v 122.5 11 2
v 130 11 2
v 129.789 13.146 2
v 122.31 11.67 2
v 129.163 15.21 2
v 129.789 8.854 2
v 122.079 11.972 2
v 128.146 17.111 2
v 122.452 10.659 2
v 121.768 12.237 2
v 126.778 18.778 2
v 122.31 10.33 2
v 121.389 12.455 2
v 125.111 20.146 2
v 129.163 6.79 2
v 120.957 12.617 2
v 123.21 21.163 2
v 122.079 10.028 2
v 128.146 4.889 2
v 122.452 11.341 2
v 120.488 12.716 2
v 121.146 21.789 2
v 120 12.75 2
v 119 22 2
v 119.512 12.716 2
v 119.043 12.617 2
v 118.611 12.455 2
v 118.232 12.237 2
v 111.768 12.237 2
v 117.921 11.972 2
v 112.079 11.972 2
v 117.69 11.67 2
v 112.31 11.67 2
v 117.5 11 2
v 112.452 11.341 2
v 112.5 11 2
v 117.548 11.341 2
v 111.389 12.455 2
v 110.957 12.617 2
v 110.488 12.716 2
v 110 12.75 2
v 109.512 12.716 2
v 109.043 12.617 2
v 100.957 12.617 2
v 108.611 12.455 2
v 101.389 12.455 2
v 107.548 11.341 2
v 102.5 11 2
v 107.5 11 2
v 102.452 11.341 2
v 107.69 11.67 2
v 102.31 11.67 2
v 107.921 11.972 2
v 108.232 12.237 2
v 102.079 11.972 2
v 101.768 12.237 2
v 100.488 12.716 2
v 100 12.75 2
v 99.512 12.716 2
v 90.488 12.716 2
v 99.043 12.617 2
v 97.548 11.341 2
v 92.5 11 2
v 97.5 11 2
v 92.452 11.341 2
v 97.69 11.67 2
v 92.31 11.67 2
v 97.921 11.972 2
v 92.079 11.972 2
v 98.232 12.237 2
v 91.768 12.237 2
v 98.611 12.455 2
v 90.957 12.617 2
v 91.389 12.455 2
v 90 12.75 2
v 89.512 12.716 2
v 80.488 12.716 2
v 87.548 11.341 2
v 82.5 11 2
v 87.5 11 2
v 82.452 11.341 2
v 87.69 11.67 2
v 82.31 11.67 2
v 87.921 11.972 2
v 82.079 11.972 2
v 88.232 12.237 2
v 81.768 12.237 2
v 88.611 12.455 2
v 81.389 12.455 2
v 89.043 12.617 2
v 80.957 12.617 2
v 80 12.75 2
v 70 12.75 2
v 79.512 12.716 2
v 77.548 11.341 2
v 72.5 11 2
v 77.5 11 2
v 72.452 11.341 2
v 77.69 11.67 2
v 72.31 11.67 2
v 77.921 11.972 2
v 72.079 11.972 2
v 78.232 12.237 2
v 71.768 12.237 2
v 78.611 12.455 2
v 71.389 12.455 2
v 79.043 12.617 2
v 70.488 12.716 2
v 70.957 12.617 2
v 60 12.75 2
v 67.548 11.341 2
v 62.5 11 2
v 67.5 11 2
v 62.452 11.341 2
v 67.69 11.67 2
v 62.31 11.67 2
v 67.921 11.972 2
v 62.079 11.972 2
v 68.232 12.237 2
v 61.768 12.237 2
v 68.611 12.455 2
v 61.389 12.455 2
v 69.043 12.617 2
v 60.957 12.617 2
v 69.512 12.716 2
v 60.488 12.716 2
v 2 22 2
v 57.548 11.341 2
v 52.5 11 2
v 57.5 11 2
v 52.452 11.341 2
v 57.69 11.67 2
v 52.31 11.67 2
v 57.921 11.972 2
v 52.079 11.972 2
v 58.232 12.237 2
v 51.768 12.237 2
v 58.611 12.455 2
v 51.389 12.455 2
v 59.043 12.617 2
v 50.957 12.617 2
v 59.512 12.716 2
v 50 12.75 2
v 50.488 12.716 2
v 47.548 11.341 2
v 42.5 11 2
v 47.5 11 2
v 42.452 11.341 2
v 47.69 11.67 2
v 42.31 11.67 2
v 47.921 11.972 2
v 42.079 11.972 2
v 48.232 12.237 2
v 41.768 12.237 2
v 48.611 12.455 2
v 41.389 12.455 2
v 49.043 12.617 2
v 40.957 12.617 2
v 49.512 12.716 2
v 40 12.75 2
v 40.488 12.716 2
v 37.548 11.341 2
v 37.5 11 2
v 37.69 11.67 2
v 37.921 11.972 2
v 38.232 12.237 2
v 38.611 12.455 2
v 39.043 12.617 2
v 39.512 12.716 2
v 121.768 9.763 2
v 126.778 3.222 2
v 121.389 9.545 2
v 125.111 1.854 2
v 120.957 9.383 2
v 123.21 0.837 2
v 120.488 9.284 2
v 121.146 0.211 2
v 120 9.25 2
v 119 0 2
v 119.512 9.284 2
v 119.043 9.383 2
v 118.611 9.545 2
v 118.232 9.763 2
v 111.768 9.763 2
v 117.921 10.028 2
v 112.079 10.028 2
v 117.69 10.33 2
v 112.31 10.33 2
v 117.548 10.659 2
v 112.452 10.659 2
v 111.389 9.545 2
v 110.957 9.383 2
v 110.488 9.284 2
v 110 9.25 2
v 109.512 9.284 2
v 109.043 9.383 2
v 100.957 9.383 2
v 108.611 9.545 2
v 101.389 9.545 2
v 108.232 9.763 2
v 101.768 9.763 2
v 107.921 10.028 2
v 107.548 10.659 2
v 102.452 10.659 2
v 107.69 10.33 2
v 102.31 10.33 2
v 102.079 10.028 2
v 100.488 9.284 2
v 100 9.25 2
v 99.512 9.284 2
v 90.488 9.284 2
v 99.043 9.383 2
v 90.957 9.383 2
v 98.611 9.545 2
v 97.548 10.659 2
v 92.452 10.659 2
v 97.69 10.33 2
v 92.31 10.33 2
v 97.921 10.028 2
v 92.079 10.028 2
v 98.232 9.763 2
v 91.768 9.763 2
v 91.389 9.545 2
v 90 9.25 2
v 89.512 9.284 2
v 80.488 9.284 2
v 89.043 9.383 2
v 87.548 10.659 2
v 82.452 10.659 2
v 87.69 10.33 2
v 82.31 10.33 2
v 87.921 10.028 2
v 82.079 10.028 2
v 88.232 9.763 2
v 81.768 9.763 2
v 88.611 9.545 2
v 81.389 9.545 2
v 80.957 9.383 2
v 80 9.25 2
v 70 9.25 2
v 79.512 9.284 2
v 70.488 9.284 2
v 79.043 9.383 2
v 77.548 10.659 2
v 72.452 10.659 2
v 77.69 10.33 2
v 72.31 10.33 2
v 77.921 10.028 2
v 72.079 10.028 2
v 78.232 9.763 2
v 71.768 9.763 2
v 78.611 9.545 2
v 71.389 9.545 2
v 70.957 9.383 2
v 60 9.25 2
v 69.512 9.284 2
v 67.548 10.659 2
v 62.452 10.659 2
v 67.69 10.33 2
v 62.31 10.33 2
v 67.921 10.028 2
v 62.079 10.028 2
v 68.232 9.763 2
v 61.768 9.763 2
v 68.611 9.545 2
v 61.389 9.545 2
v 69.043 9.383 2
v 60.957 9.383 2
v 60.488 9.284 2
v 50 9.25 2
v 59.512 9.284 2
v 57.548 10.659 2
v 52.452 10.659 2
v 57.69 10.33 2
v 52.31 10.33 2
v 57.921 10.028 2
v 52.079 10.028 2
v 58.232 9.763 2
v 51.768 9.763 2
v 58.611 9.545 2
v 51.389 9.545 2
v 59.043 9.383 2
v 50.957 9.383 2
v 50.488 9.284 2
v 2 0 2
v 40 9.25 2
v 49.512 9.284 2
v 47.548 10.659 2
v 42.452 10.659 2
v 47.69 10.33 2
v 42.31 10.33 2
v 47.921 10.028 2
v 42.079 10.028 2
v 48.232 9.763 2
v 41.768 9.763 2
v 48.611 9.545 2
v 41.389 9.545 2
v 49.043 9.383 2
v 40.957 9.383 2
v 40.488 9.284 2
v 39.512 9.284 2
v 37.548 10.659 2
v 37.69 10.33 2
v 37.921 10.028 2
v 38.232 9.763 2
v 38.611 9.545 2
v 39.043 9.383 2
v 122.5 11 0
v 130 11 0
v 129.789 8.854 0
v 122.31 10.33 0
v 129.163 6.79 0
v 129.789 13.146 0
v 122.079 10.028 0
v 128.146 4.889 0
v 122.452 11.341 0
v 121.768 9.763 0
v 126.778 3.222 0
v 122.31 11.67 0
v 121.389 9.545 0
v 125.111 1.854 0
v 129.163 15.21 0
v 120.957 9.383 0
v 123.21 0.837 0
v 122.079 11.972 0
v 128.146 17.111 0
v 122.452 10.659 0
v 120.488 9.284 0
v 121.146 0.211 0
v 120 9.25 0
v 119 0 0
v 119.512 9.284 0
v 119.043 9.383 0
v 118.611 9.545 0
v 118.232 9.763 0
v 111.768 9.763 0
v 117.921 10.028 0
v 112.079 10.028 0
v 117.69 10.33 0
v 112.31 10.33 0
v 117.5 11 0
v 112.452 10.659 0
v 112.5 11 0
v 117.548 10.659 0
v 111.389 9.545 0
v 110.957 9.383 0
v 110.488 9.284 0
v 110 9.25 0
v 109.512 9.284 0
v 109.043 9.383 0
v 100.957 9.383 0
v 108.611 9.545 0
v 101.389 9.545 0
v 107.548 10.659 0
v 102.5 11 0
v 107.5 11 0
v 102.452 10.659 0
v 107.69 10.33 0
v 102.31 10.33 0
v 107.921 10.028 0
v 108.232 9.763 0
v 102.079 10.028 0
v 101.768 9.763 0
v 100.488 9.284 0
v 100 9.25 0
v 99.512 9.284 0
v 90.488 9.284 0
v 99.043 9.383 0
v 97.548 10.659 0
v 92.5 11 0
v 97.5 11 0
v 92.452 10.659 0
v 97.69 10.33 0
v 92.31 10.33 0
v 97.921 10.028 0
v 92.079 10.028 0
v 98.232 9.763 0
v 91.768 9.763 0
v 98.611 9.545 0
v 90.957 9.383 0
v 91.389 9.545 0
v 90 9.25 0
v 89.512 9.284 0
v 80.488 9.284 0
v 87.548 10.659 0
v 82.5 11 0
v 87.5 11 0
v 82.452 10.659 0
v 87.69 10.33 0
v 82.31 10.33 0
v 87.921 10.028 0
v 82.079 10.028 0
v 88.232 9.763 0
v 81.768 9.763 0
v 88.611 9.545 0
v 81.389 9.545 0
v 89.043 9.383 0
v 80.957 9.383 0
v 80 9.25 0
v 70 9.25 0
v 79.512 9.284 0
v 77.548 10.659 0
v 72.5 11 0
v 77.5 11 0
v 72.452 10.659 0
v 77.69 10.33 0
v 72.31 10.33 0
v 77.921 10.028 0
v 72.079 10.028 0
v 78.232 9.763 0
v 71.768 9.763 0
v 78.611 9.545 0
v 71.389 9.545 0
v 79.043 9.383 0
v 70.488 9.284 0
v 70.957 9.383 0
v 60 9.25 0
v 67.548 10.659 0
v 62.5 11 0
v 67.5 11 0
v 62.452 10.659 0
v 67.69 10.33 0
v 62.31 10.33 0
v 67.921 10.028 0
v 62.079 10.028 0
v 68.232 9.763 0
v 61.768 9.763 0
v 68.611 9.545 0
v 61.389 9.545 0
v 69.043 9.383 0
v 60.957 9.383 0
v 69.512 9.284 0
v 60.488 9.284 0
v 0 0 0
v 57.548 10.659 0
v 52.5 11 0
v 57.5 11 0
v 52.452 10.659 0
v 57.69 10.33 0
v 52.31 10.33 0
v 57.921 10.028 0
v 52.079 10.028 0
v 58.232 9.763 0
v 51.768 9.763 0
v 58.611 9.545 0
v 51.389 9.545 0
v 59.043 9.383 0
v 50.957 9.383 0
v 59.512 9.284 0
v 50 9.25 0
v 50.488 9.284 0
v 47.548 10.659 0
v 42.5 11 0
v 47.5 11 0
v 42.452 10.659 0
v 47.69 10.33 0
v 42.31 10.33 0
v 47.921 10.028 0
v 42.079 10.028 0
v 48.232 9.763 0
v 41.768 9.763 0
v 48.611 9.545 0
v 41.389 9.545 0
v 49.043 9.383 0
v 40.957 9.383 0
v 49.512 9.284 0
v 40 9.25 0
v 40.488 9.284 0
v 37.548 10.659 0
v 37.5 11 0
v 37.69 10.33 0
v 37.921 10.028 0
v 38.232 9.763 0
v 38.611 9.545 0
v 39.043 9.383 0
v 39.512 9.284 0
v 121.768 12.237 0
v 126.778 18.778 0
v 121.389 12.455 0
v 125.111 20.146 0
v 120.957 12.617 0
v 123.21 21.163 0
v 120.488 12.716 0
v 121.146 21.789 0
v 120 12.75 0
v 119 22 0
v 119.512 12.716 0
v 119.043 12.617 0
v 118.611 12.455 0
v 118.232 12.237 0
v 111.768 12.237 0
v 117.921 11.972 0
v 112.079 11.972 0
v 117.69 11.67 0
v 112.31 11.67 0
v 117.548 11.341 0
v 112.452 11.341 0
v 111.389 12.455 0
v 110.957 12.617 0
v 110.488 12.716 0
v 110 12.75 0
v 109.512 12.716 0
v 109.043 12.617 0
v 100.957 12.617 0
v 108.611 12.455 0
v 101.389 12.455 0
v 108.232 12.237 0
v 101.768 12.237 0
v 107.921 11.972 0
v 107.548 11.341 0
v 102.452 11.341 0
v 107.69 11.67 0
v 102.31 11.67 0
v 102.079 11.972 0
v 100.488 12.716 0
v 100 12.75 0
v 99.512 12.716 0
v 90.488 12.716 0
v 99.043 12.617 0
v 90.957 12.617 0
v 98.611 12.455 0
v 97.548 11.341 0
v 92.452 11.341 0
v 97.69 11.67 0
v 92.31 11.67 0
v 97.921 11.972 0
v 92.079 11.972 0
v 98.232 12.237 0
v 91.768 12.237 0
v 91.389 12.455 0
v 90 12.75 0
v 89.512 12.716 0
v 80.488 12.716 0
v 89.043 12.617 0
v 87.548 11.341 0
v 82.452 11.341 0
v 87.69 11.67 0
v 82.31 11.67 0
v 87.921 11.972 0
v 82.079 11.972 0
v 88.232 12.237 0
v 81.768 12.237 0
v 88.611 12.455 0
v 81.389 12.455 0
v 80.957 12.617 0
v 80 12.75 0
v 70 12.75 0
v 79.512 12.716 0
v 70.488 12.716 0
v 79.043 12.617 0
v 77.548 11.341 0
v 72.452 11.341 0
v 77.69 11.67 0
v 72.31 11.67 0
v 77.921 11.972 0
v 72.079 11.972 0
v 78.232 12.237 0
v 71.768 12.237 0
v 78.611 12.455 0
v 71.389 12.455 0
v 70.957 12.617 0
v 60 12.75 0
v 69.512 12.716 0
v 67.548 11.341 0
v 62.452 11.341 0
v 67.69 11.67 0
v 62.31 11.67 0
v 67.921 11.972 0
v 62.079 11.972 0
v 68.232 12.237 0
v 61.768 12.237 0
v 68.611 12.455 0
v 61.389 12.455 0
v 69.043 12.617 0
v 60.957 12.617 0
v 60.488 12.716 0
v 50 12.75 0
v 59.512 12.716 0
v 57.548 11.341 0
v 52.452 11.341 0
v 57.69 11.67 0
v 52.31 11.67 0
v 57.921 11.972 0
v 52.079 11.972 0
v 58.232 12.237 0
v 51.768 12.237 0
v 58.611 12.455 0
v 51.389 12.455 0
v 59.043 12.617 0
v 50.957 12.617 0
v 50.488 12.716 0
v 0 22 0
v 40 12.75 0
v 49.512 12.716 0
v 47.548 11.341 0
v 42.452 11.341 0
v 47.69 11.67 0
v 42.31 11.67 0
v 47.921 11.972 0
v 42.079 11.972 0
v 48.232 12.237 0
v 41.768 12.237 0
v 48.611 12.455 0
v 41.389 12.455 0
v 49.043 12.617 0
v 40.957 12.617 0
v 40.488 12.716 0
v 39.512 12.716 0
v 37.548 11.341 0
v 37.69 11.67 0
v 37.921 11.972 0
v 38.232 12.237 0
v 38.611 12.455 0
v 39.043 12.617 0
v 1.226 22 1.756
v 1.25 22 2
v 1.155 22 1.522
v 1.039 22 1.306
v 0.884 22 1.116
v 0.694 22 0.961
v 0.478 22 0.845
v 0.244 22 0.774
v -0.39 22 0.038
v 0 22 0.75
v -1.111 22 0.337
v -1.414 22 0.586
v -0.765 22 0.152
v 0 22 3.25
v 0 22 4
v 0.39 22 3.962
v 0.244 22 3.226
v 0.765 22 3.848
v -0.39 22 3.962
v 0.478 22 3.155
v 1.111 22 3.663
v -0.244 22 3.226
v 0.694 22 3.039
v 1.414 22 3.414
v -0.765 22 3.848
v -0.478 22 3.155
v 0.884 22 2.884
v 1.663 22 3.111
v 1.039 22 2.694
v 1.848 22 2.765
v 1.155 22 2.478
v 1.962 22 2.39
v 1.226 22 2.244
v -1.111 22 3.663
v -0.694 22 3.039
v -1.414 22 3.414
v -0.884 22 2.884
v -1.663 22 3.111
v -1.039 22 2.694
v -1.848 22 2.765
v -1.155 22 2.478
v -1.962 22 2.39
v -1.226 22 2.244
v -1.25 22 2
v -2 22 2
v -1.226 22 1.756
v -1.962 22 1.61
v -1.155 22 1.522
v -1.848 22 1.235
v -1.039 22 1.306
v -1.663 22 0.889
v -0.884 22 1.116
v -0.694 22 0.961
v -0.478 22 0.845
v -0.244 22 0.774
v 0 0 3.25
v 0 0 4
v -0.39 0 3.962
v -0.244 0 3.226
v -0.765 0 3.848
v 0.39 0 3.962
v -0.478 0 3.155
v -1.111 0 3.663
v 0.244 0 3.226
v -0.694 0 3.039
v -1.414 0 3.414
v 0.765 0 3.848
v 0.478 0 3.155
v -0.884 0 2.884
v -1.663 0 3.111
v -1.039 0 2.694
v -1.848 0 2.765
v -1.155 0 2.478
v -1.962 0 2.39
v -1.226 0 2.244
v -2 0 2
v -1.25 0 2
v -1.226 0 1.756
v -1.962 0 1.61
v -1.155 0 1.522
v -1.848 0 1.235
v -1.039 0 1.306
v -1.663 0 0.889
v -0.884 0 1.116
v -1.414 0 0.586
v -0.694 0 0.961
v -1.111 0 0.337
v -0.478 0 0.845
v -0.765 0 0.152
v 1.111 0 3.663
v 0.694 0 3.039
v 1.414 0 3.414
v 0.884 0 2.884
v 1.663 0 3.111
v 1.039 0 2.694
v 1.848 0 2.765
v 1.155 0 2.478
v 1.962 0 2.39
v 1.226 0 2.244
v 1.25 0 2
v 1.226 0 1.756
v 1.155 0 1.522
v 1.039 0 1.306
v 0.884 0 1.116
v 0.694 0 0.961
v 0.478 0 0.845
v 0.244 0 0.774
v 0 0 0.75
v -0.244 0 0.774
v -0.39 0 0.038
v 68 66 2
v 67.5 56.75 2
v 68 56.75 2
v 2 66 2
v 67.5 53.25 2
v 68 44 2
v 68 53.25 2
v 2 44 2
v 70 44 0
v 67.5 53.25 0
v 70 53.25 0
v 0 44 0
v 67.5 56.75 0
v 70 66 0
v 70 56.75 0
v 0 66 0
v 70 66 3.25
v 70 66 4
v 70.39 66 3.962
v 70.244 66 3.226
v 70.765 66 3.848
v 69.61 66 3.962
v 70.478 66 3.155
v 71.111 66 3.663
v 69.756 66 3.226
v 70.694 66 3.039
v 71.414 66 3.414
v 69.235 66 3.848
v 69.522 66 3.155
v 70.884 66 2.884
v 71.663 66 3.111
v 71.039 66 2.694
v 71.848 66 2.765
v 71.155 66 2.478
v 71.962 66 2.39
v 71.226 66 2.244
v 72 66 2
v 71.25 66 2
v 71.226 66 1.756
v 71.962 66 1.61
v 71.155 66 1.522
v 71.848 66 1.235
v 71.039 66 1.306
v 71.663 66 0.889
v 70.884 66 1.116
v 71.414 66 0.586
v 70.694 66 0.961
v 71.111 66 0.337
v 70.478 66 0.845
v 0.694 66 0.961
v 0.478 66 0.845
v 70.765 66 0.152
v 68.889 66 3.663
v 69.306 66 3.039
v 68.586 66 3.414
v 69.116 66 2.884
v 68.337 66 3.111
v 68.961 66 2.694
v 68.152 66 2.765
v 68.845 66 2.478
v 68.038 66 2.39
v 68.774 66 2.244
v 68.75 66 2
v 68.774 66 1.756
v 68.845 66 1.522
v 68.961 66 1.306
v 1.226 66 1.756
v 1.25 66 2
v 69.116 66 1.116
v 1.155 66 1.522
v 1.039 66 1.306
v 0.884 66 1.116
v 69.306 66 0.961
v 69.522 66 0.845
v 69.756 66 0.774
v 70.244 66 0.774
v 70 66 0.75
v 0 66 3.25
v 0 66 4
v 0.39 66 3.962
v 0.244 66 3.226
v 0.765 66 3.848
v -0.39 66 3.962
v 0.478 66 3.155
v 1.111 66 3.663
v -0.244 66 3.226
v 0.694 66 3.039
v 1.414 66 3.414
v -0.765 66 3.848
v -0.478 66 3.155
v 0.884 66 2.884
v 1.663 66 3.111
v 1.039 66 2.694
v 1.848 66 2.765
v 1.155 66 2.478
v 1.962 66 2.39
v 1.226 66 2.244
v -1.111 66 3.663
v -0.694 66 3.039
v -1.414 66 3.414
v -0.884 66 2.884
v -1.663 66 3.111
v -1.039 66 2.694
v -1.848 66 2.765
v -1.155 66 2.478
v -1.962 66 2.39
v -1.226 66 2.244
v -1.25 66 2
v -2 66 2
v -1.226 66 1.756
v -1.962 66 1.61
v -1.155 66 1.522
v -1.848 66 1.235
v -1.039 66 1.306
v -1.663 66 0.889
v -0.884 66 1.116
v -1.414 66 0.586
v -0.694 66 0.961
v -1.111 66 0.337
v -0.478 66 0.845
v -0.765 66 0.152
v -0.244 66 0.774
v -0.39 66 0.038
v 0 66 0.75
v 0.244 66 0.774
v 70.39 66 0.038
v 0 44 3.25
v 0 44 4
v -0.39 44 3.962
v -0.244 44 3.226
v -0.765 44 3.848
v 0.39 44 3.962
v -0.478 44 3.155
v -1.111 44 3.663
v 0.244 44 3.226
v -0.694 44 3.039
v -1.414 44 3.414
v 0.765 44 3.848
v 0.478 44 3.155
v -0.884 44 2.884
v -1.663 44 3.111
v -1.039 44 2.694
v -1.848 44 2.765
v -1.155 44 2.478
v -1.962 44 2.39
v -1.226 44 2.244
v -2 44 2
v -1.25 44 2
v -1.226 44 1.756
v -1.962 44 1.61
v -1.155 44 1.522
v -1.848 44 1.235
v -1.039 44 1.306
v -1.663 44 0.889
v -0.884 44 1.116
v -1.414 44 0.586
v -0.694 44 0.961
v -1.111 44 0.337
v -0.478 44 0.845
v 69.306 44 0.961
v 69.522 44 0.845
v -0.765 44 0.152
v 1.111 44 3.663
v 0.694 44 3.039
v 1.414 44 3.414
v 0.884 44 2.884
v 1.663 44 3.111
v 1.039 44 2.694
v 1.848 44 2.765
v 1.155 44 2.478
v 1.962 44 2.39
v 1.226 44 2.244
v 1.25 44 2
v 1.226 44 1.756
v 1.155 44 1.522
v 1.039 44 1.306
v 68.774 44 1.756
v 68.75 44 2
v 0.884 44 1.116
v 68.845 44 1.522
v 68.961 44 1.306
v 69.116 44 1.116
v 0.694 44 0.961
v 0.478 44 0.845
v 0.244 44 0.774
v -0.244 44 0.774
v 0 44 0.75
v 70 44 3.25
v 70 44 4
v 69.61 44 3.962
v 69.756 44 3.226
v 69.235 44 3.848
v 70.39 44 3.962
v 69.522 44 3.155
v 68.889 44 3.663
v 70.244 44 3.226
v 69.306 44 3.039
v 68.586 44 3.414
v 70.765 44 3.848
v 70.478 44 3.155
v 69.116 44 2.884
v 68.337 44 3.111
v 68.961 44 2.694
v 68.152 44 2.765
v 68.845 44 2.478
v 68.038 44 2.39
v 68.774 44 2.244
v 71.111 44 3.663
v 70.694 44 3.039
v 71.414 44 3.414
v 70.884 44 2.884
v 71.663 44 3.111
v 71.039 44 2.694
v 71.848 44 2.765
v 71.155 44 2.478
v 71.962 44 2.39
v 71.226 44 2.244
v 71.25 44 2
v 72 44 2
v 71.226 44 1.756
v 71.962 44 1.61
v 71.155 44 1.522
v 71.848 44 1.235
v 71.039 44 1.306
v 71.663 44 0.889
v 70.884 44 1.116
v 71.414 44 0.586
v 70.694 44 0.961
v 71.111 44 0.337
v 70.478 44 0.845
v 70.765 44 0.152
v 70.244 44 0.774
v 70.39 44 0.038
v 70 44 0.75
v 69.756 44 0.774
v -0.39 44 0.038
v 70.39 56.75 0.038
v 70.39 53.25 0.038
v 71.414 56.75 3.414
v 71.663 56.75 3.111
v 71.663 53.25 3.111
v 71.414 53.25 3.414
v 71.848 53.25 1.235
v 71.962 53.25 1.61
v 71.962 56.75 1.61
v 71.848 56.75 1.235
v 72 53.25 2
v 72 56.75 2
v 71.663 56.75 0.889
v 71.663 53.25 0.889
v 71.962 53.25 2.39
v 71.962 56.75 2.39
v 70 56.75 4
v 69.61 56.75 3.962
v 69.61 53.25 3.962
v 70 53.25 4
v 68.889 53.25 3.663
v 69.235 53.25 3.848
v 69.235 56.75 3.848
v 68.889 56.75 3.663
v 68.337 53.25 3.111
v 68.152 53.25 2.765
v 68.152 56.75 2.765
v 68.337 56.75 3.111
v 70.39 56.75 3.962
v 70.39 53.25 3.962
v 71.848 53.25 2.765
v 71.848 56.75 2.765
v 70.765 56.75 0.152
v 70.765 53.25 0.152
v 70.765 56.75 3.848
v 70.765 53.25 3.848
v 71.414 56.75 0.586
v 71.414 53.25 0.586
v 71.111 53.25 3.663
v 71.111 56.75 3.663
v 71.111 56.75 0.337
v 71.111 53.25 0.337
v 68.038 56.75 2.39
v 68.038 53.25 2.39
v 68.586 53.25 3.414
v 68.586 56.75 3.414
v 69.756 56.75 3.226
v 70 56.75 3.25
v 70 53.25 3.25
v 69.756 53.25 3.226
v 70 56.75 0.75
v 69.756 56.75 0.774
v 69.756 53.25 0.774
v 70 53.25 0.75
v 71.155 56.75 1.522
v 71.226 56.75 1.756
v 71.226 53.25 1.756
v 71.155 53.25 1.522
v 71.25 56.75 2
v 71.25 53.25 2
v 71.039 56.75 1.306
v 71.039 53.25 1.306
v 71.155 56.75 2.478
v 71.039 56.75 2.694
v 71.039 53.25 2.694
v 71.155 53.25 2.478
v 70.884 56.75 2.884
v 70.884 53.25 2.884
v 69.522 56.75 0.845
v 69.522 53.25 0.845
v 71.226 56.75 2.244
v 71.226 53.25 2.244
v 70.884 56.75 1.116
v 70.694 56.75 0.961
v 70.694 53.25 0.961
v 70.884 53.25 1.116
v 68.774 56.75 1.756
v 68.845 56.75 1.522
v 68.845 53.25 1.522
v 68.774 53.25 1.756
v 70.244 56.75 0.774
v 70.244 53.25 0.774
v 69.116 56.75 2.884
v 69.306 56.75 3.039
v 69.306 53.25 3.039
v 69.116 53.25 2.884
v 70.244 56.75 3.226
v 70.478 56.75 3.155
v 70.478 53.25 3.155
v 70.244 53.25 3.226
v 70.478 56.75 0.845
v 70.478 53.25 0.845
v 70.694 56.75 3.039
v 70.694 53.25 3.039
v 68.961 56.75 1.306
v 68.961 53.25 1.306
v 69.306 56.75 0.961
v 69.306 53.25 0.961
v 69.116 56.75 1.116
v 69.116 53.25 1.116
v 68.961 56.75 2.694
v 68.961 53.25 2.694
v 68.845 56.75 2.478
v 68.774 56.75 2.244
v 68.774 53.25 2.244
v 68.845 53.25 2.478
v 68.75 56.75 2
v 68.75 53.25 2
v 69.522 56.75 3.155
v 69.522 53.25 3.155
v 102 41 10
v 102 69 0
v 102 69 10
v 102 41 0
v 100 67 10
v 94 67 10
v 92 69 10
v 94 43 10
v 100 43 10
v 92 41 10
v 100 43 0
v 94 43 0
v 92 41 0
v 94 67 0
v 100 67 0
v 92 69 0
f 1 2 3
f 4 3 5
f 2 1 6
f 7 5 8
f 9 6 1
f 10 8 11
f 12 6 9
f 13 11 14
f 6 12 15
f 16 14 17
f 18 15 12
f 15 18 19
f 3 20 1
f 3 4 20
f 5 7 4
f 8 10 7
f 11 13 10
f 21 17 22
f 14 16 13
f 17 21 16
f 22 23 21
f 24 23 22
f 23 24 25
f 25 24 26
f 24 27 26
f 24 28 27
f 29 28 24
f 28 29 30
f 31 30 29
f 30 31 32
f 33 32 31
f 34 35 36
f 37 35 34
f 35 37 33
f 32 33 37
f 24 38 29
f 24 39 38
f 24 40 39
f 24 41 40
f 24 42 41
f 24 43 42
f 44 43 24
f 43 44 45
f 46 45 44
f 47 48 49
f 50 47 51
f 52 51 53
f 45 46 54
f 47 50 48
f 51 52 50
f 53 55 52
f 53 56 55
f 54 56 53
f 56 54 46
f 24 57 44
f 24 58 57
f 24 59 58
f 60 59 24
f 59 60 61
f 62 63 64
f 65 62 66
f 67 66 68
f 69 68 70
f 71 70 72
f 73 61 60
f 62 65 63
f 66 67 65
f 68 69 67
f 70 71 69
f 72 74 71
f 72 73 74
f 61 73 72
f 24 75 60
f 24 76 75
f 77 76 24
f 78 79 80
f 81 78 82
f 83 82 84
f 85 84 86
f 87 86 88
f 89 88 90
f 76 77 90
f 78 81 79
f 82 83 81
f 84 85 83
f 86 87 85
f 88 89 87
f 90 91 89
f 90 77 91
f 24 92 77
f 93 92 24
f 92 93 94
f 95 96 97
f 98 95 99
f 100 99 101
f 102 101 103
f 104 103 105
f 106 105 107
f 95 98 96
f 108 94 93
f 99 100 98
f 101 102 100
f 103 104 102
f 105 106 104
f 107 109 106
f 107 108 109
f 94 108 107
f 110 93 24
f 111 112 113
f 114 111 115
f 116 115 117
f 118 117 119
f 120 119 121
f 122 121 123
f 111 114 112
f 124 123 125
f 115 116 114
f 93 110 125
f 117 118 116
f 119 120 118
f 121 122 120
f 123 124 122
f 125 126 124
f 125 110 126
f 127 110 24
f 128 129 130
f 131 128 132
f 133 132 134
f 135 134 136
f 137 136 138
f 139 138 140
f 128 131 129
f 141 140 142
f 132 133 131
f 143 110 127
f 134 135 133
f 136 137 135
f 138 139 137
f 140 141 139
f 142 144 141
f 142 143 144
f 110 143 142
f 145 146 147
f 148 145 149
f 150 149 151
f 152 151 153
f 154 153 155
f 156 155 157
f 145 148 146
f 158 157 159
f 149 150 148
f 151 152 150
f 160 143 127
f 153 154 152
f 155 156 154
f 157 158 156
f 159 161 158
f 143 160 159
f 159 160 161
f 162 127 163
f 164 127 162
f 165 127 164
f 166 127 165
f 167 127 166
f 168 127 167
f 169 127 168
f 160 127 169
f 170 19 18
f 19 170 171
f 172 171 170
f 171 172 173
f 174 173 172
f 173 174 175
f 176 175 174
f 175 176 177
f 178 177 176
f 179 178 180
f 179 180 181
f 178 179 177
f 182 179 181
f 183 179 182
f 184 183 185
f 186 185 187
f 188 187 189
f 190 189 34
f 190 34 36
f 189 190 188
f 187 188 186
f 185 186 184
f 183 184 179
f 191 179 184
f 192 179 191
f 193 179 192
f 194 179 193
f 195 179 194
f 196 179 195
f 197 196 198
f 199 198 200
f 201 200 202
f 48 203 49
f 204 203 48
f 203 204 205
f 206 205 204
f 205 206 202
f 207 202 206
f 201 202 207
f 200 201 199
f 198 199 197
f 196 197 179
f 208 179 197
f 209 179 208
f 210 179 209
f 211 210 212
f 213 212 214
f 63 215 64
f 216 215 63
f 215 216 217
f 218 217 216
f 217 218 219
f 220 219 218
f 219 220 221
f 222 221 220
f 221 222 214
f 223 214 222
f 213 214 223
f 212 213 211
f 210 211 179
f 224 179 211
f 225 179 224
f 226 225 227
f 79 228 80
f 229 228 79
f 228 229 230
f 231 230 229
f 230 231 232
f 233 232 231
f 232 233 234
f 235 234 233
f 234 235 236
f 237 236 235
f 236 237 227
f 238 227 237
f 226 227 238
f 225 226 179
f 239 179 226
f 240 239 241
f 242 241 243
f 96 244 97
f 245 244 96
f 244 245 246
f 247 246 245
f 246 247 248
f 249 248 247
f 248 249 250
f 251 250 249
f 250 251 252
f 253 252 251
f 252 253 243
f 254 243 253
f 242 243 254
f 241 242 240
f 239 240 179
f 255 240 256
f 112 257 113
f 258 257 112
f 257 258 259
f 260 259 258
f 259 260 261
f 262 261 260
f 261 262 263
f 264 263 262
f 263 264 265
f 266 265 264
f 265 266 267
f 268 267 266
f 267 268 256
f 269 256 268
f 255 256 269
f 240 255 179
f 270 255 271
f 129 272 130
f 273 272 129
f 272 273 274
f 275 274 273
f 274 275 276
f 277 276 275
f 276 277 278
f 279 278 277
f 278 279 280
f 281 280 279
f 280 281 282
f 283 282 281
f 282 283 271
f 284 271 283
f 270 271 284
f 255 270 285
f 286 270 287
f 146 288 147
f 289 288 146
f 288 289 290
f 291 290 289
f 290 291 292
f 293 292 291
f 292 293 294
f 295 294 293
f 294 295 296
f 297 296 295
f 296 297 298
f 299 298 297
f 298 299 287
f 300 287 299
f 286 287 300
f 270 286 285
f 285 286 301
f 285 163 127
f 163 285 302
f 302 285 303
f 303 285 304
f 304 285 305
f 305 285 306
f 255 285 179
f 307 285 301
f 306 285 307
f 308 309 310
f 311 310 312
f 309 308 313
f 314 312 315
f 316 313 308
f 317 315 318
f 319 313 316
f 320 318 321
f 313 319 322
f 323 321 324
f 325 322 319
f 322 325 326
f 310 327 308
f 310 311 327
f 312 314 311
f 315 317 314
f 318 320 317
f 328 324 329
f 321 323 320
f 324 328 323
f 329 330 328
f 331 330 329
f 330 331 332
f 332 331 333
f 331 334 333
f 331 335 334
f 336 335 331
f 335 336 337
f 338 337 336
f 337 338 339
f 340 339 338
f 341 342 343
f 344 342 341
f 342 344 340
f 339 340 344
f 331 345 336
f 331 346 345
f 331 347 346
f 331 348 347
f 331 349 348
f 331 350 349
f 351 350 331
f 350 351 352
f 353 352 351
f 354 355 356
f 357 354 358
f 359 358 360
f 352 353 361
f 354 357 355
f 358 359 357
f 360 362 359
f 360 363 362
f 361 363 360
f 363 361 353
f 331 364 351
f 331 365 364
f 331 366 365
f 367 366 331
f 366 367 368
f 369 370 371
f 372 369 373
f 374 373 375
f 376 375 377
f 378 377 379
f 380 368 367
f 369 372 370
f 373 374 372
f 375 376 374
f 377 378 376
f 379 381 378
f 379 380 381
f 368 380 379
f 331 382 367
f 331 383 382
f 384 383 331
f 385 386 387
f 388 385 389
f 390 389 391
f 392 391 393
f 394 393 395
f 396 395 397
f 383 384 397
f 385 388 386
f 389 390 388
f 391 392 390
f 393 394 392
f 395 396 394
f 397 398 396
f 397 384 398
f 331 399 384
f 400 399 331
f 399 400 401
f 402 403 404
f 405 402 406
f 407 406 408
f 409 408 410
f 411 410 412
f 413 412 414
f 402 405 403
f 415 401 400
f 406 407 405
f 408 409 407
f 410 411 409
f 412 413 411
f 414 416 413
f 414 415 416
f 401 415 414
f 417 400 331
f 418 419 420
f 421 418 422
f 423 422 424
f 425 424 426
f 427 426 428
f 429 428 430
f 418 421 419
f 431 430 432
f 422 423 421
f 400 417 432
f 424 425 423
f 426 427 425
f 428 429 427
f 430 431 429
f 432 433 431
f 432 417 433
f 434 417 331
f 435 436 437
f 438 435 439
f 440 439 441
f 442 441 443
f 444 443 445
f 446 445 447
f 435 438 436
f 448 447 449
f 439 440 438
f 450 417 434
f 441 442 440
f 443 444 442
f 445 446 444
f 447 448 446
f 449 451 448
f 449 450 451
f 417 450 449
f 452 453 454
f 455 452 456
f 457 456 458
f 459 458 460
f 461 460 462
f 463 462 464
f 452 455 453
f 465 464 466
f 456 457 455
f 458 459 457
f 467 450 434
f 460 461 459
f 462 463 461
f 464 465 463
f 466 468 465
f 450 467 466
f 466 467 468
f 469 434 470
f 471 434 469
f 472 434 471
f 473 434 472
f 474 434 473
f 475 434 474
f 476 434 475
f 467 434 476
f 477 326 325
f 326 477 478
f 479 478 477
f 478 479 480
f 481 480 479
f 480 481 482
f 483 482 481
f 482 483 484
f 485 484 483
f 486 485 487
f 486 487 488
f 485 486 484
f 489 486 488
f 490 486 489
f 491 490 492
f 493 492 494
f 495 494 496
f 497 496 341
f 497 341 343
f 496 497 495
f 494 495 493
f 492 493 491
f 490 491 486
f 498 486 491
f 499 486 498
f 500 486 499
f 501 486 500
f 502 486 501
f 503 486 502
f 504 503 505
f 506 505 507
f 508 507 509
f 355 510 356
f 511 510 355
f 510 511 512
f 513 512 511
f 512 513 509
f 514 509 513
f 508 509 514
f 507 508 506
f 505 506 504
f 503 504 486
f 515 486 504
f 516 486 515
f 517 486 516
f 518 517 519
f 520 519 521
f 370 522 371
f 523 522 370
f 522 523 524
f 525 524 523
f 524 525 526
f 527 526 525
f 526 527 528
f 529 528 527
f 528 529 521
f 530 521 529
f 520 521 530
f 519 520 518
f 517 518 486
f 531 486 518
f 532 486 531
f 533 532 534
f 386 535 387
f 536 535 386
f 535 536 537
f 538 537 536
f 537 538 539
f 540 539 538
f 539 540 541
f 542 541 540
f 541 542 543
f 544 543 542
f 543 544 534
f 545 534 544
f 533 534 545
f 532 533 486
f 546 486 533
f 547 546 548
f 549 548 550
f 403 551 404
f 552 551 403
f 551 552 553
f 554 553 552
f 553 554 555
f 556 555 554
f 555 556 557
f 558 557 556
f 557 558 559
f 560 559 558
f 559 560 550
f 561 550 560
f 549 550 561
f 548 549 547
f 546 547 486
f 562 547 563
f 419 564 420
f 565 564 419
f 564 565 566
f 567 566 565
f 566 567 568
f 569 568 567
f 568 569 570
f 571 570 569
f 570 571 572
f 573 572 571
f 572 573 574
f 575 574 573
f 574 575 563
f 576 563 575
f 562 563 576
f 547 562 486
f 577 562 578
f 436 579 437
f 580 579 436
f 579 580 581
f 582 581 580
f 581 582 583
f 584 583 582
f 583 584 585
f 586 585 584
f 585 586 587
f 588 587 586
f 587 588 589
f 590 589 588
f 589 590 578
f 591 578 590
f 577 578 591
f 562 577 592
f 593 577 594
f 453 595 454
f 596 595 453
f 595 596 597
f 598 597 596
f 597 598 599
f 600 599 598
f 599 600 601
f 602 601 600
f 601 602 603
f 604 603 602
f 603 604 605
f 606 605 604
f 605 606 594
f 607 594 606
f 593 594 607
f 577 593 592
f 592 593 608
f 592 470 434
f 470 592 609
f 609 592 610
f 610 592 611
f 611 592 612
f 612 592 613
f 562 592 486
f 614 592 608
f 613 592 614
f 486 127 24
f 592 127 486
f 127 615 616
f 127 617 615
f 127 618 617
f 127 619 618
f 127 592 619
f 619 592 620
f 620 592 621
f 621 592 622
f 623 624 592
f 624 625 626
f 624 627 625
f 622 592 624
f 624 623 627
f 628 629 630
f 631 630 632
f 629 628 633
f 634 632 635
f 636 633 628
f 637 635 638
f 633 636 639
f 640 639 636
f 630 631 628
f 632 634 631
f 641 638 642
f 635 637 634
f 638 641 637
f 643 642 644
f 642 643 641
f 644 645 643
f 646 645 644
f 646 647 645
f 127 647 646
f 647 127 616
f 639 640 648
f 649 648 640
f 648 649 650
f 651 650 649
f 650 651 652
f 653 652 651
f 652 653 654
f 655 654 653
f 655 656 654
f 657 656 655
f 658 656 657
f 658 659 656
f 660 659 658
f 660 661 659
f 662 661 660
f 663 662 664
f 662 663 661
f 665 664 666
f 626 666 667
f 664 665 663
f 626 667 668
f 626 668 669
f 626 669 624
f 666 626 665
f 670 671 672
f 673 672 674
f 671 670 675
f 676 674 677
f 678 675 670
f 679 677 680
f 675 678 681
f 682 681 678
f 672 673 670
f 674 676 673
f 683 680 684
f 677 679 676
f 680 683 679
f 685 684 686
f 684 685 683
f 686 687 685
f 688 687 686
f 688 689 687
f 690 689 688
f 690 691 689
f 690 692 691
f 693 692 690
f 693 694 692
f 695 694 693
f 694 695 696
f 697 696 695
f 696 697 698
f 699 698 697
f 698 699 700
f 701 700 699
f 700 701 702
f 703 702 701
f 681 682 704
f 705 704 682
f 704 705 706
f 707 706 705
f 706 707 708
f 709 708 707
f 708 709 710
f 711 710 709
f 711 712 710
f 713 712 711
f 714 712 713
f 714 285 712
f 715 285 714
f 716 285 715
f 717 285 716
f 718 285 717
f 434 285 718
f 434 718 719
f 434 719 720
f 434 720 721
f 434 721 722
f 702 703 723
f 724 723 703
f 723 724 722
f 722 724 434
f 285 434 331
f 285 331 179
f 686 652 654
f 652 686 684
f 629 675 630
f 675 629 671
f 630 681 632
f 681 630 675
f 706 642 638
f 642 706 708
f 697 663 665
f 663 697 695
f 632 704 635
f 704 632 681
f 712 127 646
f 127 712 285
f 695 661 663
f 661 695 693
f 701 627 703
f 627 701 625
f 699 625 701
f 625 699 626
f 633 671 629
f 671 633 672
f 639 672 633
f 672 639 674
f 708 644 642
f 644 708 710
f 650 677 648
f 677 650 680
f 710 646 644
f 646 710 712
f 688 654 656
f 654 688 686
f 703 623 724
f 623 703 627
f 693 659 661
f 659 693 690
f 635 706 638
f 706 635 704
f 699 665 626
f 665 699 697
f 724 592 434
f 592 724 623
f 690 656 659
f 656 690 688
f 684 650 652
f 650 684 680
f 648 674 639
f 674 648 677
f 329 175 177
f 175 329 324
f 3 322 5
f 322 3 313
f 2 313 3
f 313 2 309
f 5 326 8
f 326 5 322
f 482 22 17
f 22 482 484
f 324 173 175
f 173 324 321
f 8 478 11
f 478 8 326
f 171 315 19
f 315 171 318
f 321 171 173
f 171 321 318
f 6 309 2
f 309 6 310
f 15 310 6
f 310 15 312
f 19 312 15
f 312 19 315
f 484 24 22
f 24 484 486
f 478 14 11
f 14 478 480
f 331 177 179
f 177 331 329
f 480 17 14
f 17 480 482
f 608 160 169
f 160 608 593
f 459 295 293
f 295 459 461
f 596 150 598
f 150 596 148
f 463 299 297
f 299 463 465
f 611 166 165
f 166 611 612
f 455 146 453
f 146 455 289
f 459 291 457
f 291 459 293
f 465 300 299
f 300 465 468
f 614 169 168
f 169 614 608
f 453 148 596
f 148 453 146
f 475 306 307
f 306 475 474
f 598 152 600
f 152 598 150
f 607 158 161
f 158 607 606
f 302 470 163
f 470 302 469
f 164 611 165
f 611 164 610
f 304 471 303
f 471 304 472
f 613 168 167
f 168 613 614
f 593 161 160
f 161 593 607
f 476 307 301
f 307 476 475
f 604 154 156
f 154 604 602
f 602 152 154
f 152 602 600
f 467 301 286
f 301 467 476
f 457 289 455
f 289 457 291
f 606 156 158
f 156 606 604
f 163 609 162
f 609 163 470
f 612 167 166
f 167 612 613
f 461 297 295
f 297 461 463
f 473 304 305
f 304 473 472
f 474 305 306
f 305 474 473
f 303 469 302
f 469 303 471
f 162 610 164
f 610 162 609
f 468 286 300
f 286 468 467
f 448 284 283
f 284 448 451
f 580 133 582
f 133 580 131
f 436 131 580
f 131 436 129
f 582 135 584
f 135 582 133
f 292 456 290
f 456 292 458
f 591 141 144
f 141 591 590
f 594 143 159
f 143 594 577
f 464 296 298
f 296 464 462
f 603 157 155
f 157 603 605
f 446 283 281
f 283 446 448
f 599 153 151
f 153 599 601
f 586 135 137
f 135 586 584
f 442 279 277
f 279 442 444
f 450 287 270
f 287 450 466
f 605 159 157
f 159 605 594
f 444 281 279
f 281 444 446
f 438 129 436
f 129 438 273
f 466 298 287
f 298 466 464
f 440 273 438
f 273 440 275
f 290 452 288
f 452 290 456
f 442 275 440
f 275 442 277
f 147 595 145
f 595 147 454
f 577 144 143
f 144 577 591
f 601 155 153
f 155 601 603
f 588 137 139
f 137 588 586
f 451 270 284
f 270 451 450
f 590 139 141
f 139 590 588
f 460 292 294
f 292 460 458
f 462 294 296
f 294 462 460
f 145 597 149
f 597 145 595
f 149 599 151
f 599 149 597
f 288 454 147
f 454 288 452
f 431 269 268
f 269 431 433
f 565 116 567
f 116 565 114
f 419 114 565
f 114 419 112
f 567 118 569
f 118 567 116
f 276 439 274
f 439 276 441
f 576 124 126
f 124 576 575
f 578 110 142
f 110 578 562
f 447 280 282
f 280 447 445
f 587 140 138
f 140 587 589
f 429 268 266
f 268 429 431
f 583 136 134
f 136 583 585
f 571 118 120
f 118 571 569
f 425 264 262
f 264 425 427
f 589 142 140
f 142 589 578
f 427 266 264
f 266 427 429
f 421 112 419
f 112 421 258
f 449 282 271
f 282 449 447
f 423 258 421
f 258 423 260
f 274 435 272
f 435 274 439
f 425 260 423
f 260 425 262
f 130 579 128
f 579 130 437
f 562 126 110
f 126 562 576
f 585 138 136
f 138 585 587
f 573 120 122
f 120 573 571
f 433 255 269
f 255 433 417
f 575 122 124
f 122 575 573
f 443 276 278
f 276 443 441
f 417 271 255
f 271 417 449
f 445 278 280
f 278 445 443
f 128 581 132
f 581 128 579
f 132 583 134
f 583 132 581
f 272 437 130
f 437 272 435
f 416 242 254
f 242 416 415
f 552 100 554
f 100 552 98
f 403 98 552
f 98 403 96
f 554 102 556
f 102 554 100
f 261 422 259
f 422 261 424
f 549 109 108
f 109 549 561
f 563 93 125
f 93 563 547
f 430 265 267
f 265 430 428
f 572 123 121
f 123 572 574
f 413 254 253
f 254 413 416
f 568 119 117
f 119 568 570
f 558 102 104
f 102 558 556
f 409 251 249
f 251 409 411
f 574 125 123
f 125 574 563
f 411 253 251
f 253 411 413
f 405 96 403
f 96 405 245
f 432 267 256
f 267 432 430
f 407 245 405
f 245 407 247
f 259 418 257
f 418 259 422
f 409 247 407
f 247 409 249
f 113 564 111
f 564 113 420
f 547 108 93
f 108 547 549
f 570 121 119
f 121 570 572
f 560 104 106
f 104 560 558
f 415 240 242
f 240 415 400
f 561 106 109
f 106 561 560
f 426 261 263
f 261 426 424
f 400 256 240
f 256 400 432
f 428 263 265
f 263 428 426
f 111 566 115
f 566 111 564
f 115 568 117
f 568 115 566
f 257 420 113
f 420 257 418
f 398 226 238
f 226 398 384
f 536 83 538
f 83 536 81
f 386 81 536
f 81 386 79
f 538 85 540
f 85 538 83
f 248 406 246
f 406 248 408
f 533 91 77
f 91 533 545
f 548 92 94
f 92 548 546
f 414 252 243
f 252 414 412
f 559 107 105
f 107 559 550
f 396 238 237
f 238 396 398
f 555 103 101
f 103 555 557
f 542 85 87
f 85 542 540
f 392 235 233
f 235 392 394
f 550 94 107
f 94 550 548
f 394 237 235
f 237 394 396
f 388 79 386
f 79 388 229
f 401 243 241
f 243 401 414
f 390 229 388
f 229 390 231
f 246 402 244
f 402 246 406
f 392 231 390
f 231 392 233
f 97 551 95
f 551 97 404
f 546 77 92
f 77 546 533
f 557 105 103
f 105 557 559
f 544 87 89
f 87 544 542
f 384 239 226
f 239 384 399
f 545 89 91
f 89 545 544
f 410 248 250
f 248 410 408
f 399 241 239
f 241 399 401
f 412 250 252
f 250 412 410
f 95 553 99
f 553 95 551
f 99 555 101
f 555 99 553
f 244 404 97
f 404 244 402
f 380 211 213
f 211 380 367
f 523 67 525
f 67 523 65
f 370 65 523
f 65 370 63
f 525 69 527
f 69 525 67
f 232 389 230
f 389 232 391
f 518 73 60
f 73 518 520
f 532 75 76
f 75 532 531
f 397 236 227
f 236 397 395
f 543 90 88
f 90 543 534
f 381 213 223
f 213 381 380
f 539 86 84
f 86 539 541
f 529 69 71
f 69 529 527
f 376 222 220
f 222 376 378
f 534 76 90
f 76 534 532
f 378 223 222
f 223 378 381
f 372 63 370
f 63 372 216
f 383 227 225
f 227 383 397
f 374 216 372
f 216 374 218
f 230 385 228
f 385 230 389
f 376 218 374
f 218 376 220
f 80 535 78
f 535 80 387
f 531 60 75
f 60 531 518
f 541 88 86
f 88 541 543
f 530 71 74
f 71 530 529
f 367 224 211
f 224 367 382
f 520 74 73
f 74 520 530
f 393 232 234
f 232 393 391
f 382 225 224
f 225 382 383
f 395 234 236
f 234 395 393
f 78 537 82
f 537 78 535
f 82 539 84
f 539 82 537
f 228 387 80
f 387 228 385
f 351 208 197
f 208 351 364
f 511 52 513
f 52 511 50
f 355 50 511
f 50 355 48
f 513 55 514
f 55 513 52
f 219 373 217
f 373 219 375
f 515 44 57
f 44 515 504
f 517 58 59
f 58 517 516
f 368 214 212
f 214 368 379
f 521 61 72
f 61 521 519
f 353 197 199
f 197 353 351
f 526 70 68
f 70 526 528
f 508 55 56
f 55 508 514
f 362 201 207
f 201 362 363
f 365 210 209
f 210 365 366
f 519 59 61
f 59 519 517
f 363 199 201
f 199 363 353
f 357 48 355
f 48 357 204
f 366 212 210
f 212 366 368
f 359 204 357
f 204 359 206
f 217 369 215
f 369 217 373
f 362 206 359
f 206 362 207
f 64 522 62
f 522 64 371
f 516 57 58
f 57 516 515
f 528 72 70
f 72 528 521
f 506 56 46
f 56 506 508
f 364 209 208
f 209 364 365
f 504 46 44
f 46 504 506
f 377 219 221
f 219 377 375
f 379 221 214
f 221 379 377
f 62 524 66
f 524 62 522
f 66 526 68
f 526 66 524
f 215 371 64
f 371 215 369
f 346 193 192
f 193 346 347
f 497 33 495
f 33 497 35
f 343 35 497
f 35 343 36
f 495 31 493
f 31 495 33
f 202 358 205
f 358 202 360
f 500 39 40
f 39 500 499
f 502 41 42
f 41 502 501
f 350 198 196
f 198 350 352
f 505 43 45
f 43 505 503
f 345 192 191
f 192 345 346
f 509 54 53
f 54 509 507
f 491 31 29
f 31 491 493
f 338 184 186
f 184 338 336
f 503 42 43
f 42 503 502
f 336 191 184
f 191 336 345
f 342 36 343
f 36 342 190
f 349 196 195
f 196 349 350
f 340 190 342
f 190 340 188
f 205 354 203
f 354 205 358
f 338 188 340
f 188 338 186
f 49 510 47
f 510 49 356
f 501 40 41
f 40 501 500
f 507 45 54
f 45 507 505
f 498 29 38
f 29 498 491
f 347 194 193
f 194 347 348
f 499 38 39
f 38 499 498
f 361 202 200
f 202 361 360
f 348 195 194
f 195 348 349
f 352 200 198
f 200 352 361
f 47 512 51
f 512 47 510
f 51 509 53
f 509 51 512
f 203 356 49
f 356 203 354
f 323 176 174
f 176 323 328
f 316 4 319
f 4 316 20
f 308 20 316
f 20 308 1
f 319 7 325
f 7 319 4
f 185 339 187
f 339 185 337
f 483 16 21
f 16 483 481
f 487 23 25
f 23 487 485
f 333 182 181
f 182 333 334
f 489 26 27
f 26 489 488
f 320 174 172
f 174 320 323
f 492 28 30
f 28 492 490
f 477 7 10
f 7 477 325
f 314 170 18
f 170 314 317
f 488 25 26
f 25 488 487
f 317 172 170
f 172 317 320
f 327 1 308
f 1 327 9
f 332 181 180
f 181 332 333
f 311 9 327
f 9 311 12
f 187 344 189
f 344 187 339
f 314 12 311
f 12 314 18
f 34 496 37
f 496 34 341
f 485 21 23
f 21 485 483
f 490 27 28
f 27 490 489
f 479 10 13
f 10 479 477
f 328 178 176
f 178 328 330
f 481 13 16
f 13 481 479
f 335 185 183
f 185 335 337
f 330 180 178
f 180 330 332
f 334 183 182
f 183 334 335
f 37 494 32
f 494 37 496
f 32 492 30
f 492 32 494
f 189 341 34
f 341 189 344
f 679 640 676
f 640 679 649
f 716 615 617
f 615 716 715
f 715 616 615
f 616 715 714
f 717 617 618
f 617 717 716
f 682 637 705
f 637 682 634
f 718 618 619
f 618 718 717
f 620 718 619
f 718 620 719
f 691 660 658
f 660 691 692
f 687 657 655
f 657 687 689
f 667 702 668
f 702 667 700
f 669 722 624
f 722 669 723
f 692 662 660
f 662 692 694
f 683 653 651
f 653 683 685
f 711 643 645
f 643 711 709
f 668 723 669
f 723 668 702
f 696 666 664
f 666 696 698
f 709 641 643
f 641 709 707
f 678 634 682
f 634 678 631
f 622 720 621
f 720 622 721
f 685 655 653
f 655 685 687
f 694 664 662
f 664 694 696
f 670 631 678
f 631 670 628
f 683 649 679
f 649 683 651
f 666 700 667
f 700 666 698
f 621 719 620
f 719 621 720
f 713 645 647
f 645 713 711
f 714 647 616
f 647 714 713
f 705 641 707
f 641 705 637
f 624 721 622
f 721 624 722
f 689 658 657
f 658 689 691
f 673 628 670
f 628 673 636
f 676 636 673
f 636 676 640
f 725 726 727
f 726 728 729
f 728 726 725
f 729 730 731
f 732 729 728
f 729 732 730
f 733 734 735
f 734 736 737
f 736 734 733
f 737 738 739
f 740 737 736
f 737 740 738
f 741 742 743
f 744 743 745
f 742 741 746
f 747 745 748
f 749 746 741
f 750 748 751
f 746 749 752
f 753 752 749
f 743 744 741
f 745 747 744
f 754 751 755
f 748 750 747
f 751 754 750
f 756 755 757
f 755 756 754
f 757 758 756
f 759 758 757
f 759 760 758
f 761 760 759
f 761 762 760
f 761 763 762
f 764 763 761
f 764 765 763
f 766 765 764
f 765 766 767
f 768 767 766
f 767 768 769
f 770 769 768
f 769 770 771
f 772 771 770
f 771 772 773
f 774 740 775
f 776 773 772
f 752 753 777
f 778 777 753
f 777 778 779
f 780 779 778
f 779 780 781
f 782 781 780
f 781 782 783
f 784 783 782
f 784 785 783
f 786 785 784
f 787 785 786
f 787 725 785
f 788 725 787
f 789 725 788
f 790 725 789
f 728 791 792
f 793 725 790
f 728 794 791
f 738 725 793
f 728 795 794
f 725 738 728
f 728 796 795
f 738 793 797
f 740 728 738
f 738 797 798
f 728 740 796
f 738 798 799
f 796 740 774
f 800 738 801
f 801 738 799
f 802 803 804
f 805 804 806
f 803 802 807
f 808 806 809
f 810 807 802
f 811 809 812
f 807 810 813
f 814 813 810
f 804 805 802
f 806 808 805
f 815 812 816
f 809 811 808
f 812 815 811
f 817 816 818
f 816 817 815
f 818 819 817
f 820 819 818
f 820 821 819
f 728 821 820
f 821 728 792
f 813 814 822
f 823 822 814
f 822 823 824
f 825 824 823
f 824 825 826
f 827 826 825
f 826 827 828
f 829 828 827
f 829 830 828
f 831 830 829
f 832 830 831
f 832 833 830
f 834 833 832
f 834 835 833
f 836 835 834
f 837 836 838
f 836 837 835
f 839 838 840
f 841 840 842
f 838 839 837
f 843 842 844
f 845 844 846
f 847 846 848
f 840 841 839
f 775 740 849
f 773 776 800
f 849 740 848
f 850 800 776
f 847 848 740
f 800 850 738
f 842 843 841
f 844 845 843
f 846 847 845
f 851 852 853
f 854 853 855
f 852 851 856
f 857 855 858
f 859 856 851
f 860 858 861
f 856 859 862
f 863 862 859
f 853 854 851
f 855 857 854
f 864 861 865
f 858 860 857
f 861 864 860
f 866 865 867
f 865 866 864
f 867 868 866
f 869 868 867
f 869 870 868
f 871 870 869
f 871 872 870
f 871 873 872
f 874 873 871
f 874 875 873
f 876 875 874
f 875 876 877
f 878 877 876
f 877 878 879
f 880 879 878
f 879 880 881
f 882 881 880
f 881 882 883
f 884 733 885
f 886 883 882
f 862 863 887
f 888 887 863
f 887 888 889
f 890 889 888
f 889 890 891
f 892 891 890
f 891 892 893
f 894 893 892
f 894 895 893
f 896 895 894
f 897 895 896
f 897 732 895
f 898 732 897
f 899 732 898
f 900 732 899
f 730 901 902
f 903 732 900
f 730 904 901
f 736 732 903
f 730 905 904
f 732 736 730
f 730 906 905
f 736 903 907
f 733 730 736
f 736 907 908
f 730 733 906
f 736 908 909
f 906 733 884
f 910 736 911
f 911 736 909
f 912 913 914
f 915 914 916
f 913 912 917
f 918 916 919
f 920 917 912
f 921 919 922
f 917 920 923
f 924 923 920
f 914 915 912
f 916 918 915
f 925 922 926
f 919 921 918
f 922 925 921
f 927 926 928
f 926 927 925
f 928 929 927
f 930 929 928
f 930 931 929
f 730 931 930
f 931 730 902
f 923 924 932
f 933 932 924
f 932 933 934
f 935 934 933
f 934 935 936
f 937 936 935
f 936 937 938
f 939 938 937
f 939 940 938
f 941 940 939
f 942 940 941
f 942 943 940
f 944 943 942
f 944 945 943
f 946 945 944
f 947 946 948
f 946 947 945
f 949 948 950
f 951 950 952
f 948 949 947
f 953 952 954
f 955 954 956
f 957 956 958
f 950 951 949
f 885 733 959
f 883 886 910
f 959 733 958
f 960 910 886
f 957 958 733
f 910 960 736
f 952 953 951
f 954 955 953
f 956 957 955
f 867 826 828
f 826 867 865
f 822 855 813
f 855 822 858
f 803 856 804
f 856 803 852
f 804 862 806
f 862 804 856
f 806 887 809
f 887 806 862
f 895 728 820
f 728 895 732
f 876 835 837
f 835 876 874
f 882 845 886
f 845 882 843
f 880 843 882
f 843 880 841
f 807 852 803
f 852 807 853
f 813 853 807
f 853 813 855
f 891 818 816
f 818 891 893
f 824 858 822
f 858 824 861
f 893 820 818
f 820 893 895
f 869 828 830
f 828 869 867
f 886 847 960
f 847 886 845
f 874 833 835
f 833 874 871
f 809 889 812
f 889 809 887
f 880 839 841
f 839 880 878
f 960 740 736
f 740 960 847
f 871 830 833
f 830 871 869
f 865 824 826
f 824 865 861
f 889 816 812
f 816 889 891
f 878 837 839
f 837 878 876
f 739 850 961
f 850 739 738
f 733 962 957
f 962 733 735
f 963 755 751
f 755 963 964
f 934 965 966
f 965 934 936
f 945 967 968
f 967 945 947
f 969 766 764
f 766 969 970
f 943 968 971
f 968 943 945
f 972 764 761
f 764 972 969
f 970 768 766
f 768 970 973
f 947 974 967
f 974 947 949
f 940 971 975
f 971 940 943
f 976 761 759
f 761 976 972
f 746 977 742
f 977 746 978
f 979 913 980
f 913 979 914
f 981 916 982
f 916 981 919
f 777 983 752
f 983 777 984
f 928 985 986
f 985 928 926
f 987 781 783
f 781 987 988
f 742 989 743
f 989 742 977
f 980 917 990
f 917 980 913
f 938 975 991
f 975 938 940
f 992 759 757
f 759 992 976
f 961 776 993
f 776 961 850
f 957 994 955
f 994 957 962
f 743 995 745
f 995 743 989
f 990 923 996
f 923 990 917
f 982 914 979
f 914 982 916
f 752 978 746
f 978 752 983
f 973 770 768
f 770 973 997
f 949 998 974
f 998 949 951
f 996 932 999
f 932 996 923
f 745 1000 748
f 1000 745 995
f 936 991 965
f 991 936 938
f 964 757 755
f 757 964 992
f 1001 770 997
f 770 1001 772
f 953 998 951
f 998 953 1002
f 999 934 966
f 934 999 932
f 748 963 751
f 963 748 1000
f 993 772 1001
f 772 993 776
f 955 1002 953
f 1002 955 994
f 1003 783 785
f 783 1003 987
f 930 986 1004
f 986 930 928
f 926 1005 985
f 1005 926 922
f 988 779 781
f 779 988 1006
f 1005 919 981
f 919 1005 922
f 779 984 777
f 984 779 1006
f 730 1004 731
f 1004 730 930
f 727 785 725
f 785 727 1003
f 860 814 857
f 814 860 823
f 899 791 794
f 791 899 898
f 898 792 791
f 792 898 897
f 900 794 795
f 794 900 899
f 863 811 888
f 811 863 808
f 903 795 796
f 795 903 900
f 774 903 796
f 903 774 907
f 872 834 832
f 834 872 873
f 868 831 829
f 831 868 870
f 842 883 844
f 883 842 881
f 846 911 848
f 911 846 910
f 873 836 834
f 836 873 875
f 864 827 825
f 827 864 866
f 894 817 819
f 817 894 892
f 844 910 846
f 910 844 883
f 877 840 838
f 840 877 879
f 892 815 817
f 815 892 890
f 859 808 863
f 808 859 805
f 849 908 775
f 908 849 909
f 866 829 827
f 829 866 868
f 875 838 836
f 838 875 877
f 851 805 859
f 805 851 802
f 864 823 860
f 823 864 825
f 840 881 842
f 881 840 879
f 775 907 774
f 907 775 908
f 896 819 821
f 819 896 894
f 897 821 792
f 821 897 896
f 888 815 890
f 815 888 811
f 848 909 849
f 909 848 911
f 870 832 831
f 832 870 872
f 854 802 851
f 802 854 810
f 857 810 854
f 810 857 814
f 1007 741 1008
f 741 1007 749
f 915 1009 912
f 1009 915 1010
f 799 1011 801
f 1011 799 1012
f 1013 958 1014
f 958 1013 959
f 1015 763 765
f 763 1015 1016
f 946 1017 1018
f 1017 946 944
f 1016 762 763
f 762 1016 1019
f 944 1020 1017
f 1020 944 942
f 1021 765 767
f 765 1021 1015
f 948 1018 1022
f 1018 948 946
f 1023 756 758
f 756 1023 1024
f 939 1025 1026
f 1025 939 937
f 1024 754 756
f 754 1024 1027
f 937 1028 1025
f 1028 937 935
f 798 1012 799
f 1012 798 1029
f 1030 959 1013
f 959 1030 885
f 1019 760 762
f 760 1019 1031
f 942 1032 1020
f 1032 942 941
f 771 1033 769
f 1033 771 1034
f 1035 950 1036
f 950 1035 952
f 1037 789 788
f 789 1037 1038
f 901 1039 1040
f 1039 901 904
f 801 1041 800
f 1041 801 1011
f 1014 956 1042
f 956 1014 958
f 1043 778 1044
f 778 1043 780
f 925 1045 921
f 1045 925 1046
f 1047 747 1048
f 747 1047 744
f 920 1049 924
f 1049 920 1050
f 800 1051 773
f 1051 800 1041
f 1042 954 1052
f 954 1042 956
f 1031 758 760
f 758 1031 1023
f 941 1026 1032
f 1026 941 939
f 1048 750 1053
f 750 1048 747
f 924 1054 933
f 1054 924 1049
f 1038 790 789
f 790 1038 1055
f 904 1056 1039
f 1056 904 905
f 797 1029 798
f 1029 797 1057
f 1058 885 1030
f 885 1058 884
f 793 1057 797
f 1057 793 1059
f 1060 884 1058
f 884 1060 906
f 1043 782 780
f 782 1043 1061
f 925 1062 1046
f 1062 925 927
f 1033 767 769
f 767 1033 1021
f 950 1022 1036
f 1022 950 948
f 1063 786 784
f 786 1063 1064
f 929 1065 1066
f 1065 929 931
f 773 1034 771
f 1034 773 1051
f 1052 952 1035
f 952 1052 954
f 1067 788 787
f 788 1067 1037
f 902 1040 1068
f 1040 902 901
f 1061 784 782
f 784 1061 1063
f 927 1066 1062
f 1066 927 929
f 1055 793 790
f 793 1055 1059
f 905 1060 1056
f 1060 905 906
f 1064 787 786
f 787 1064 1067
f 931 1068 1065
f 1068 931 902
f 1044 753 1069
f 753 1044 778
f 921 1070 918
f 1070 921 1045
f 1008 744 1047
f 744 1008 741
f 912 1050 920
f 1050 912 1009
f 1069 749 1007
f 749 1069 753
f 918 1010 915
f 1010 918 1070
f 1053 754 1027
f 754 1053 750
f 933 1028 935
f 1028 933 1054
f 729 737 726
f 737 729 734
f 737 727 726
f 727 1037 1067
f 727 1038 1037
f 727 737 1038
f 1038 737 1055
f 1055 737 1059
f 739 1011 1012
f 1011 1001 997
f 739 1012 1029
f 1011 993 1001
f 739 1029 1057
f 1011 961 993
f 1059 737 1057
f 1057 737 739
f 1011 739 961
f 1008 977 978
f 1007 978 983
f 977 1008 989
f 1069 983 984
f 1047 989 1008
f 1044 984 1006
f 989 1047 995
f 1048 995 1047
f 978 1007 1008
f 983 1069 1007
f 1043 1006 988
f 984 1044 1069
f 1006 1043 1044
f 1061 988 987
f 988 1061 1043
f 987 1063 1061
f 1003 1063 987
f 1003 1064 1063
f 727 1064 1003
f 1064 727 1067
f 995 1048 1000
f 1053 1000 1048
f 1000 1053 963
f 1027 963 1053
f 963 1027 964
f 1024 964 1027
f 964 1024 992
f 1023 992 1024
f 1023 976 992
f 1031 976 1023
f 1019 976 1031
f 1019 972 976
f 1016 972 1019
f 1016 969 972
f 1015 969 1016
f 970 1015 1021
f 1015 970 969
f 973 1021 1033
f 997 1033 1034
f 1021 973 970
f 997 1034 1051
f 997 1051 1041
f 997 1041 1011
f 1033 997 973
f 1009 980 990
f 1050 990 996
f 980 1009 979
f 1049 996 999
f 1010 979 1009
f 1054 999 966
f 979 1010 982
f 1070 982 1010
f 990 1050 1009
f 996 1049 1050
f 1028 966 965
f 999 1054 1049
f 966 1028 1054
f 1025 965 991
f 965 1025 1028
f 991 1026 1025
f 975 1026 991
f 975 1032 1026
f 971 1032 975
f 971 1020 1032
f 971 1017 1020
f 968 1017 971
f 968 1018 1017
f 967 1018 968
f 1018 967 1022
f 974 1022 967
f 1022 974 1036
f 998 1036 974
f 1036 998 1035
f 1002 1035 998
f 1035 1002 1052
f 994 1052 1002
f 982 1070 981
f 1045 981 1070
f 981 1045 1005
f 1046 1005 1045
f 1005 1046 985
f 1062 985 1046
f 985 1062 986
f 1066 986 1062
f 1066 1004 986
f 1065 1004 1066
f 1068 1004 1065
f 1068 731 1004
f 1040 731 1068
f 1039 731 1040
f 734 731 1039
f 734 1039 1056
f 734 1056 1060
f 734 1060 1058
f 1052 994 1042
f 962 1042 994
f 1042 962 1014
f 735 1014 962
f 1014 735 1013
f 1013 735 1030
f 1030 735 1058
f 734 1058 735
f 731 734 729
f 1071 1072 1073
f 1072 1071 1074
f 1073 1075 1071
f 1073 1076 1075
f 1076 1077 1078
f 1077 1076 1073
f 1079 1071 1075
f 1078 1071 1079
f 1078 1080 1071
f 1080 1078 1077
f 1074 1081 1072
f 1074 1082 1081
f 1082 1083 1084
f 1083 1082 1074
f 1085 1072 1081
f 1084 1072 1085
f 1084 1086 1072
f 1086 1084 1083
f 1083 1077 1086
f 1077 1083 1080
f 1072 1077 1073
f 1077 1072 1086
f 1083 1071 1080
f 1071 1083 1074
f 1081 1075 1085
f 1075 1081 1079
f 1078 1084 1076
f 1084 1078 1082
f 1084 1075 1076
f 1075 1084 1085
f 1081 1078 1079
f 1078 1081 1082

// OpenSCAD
$fn=32;

// Length of "tongue" band
l=130;
// Length of "buckle" band
lr=70;
// Width
w=22*1;
w2=w/2;
// Thickness
t=2*1;

module left() { // strap end with holes
    difference() {
        union() {
            cube([l-w2,w,t]); // strap
            translate([0,0,t])rotate([-90,0,0]) cylinder(r=t,h=22); // around watch pin
            translate([l-w2,w2,0]) cylinder(r=w2,h=t); // round end
            }

        translate([0,-1,t]) rotate([-90,0,0]) cylinder(r=1.25, h=w+2);

        // Punch holes
        for (x=[40:10:l-1]) 
            translate([x,11,-1]) scale([1,.7,1]) cylinder(r=2.5,h=t+3);
        }
    }
    
module right() {
    difference() {
        union() {
            cube([lr,w,2]); // strap
            translate([0,0,t])rotate([-90,0,0]) cylinder(r=t,h=22); // around watch pin
            translate([lr,0,t])rotate([-90,0,0]) cylinder(r=t,h=22); // around watch pin
            }

        translate([0,-1,t]) rotate([-90,0,0]) cylinder(r=1.25, h=w+2);
        translate([lr,-1,t]) rotate([-90,0,0]) cylinder(r=1.25, h=w+2);

        // Punch holes
        translate([lr,w2,t]) scale([1,.7,1]) cube([5,5,5], center=true);//  cylinder(r=2.5,h=t+3);
        //translate([lr+t,w2,-1]) scale([1,.7,1]) cylinder(r=2.5,h=t+3);
        }
    }
    
module hold() {
    translate([0,-t-1,0]) difference() {
        cube([4*t+2,w+2*t+2,10]);
        translate([t,t,-1]) cube([2*t+2,w+2,10+2]);
        }
    }
    
module band() {
    left();
    translate([0,2*w,0]) right();
    translate([lr+w,2*w,0]) hold();
    }
    
band();
